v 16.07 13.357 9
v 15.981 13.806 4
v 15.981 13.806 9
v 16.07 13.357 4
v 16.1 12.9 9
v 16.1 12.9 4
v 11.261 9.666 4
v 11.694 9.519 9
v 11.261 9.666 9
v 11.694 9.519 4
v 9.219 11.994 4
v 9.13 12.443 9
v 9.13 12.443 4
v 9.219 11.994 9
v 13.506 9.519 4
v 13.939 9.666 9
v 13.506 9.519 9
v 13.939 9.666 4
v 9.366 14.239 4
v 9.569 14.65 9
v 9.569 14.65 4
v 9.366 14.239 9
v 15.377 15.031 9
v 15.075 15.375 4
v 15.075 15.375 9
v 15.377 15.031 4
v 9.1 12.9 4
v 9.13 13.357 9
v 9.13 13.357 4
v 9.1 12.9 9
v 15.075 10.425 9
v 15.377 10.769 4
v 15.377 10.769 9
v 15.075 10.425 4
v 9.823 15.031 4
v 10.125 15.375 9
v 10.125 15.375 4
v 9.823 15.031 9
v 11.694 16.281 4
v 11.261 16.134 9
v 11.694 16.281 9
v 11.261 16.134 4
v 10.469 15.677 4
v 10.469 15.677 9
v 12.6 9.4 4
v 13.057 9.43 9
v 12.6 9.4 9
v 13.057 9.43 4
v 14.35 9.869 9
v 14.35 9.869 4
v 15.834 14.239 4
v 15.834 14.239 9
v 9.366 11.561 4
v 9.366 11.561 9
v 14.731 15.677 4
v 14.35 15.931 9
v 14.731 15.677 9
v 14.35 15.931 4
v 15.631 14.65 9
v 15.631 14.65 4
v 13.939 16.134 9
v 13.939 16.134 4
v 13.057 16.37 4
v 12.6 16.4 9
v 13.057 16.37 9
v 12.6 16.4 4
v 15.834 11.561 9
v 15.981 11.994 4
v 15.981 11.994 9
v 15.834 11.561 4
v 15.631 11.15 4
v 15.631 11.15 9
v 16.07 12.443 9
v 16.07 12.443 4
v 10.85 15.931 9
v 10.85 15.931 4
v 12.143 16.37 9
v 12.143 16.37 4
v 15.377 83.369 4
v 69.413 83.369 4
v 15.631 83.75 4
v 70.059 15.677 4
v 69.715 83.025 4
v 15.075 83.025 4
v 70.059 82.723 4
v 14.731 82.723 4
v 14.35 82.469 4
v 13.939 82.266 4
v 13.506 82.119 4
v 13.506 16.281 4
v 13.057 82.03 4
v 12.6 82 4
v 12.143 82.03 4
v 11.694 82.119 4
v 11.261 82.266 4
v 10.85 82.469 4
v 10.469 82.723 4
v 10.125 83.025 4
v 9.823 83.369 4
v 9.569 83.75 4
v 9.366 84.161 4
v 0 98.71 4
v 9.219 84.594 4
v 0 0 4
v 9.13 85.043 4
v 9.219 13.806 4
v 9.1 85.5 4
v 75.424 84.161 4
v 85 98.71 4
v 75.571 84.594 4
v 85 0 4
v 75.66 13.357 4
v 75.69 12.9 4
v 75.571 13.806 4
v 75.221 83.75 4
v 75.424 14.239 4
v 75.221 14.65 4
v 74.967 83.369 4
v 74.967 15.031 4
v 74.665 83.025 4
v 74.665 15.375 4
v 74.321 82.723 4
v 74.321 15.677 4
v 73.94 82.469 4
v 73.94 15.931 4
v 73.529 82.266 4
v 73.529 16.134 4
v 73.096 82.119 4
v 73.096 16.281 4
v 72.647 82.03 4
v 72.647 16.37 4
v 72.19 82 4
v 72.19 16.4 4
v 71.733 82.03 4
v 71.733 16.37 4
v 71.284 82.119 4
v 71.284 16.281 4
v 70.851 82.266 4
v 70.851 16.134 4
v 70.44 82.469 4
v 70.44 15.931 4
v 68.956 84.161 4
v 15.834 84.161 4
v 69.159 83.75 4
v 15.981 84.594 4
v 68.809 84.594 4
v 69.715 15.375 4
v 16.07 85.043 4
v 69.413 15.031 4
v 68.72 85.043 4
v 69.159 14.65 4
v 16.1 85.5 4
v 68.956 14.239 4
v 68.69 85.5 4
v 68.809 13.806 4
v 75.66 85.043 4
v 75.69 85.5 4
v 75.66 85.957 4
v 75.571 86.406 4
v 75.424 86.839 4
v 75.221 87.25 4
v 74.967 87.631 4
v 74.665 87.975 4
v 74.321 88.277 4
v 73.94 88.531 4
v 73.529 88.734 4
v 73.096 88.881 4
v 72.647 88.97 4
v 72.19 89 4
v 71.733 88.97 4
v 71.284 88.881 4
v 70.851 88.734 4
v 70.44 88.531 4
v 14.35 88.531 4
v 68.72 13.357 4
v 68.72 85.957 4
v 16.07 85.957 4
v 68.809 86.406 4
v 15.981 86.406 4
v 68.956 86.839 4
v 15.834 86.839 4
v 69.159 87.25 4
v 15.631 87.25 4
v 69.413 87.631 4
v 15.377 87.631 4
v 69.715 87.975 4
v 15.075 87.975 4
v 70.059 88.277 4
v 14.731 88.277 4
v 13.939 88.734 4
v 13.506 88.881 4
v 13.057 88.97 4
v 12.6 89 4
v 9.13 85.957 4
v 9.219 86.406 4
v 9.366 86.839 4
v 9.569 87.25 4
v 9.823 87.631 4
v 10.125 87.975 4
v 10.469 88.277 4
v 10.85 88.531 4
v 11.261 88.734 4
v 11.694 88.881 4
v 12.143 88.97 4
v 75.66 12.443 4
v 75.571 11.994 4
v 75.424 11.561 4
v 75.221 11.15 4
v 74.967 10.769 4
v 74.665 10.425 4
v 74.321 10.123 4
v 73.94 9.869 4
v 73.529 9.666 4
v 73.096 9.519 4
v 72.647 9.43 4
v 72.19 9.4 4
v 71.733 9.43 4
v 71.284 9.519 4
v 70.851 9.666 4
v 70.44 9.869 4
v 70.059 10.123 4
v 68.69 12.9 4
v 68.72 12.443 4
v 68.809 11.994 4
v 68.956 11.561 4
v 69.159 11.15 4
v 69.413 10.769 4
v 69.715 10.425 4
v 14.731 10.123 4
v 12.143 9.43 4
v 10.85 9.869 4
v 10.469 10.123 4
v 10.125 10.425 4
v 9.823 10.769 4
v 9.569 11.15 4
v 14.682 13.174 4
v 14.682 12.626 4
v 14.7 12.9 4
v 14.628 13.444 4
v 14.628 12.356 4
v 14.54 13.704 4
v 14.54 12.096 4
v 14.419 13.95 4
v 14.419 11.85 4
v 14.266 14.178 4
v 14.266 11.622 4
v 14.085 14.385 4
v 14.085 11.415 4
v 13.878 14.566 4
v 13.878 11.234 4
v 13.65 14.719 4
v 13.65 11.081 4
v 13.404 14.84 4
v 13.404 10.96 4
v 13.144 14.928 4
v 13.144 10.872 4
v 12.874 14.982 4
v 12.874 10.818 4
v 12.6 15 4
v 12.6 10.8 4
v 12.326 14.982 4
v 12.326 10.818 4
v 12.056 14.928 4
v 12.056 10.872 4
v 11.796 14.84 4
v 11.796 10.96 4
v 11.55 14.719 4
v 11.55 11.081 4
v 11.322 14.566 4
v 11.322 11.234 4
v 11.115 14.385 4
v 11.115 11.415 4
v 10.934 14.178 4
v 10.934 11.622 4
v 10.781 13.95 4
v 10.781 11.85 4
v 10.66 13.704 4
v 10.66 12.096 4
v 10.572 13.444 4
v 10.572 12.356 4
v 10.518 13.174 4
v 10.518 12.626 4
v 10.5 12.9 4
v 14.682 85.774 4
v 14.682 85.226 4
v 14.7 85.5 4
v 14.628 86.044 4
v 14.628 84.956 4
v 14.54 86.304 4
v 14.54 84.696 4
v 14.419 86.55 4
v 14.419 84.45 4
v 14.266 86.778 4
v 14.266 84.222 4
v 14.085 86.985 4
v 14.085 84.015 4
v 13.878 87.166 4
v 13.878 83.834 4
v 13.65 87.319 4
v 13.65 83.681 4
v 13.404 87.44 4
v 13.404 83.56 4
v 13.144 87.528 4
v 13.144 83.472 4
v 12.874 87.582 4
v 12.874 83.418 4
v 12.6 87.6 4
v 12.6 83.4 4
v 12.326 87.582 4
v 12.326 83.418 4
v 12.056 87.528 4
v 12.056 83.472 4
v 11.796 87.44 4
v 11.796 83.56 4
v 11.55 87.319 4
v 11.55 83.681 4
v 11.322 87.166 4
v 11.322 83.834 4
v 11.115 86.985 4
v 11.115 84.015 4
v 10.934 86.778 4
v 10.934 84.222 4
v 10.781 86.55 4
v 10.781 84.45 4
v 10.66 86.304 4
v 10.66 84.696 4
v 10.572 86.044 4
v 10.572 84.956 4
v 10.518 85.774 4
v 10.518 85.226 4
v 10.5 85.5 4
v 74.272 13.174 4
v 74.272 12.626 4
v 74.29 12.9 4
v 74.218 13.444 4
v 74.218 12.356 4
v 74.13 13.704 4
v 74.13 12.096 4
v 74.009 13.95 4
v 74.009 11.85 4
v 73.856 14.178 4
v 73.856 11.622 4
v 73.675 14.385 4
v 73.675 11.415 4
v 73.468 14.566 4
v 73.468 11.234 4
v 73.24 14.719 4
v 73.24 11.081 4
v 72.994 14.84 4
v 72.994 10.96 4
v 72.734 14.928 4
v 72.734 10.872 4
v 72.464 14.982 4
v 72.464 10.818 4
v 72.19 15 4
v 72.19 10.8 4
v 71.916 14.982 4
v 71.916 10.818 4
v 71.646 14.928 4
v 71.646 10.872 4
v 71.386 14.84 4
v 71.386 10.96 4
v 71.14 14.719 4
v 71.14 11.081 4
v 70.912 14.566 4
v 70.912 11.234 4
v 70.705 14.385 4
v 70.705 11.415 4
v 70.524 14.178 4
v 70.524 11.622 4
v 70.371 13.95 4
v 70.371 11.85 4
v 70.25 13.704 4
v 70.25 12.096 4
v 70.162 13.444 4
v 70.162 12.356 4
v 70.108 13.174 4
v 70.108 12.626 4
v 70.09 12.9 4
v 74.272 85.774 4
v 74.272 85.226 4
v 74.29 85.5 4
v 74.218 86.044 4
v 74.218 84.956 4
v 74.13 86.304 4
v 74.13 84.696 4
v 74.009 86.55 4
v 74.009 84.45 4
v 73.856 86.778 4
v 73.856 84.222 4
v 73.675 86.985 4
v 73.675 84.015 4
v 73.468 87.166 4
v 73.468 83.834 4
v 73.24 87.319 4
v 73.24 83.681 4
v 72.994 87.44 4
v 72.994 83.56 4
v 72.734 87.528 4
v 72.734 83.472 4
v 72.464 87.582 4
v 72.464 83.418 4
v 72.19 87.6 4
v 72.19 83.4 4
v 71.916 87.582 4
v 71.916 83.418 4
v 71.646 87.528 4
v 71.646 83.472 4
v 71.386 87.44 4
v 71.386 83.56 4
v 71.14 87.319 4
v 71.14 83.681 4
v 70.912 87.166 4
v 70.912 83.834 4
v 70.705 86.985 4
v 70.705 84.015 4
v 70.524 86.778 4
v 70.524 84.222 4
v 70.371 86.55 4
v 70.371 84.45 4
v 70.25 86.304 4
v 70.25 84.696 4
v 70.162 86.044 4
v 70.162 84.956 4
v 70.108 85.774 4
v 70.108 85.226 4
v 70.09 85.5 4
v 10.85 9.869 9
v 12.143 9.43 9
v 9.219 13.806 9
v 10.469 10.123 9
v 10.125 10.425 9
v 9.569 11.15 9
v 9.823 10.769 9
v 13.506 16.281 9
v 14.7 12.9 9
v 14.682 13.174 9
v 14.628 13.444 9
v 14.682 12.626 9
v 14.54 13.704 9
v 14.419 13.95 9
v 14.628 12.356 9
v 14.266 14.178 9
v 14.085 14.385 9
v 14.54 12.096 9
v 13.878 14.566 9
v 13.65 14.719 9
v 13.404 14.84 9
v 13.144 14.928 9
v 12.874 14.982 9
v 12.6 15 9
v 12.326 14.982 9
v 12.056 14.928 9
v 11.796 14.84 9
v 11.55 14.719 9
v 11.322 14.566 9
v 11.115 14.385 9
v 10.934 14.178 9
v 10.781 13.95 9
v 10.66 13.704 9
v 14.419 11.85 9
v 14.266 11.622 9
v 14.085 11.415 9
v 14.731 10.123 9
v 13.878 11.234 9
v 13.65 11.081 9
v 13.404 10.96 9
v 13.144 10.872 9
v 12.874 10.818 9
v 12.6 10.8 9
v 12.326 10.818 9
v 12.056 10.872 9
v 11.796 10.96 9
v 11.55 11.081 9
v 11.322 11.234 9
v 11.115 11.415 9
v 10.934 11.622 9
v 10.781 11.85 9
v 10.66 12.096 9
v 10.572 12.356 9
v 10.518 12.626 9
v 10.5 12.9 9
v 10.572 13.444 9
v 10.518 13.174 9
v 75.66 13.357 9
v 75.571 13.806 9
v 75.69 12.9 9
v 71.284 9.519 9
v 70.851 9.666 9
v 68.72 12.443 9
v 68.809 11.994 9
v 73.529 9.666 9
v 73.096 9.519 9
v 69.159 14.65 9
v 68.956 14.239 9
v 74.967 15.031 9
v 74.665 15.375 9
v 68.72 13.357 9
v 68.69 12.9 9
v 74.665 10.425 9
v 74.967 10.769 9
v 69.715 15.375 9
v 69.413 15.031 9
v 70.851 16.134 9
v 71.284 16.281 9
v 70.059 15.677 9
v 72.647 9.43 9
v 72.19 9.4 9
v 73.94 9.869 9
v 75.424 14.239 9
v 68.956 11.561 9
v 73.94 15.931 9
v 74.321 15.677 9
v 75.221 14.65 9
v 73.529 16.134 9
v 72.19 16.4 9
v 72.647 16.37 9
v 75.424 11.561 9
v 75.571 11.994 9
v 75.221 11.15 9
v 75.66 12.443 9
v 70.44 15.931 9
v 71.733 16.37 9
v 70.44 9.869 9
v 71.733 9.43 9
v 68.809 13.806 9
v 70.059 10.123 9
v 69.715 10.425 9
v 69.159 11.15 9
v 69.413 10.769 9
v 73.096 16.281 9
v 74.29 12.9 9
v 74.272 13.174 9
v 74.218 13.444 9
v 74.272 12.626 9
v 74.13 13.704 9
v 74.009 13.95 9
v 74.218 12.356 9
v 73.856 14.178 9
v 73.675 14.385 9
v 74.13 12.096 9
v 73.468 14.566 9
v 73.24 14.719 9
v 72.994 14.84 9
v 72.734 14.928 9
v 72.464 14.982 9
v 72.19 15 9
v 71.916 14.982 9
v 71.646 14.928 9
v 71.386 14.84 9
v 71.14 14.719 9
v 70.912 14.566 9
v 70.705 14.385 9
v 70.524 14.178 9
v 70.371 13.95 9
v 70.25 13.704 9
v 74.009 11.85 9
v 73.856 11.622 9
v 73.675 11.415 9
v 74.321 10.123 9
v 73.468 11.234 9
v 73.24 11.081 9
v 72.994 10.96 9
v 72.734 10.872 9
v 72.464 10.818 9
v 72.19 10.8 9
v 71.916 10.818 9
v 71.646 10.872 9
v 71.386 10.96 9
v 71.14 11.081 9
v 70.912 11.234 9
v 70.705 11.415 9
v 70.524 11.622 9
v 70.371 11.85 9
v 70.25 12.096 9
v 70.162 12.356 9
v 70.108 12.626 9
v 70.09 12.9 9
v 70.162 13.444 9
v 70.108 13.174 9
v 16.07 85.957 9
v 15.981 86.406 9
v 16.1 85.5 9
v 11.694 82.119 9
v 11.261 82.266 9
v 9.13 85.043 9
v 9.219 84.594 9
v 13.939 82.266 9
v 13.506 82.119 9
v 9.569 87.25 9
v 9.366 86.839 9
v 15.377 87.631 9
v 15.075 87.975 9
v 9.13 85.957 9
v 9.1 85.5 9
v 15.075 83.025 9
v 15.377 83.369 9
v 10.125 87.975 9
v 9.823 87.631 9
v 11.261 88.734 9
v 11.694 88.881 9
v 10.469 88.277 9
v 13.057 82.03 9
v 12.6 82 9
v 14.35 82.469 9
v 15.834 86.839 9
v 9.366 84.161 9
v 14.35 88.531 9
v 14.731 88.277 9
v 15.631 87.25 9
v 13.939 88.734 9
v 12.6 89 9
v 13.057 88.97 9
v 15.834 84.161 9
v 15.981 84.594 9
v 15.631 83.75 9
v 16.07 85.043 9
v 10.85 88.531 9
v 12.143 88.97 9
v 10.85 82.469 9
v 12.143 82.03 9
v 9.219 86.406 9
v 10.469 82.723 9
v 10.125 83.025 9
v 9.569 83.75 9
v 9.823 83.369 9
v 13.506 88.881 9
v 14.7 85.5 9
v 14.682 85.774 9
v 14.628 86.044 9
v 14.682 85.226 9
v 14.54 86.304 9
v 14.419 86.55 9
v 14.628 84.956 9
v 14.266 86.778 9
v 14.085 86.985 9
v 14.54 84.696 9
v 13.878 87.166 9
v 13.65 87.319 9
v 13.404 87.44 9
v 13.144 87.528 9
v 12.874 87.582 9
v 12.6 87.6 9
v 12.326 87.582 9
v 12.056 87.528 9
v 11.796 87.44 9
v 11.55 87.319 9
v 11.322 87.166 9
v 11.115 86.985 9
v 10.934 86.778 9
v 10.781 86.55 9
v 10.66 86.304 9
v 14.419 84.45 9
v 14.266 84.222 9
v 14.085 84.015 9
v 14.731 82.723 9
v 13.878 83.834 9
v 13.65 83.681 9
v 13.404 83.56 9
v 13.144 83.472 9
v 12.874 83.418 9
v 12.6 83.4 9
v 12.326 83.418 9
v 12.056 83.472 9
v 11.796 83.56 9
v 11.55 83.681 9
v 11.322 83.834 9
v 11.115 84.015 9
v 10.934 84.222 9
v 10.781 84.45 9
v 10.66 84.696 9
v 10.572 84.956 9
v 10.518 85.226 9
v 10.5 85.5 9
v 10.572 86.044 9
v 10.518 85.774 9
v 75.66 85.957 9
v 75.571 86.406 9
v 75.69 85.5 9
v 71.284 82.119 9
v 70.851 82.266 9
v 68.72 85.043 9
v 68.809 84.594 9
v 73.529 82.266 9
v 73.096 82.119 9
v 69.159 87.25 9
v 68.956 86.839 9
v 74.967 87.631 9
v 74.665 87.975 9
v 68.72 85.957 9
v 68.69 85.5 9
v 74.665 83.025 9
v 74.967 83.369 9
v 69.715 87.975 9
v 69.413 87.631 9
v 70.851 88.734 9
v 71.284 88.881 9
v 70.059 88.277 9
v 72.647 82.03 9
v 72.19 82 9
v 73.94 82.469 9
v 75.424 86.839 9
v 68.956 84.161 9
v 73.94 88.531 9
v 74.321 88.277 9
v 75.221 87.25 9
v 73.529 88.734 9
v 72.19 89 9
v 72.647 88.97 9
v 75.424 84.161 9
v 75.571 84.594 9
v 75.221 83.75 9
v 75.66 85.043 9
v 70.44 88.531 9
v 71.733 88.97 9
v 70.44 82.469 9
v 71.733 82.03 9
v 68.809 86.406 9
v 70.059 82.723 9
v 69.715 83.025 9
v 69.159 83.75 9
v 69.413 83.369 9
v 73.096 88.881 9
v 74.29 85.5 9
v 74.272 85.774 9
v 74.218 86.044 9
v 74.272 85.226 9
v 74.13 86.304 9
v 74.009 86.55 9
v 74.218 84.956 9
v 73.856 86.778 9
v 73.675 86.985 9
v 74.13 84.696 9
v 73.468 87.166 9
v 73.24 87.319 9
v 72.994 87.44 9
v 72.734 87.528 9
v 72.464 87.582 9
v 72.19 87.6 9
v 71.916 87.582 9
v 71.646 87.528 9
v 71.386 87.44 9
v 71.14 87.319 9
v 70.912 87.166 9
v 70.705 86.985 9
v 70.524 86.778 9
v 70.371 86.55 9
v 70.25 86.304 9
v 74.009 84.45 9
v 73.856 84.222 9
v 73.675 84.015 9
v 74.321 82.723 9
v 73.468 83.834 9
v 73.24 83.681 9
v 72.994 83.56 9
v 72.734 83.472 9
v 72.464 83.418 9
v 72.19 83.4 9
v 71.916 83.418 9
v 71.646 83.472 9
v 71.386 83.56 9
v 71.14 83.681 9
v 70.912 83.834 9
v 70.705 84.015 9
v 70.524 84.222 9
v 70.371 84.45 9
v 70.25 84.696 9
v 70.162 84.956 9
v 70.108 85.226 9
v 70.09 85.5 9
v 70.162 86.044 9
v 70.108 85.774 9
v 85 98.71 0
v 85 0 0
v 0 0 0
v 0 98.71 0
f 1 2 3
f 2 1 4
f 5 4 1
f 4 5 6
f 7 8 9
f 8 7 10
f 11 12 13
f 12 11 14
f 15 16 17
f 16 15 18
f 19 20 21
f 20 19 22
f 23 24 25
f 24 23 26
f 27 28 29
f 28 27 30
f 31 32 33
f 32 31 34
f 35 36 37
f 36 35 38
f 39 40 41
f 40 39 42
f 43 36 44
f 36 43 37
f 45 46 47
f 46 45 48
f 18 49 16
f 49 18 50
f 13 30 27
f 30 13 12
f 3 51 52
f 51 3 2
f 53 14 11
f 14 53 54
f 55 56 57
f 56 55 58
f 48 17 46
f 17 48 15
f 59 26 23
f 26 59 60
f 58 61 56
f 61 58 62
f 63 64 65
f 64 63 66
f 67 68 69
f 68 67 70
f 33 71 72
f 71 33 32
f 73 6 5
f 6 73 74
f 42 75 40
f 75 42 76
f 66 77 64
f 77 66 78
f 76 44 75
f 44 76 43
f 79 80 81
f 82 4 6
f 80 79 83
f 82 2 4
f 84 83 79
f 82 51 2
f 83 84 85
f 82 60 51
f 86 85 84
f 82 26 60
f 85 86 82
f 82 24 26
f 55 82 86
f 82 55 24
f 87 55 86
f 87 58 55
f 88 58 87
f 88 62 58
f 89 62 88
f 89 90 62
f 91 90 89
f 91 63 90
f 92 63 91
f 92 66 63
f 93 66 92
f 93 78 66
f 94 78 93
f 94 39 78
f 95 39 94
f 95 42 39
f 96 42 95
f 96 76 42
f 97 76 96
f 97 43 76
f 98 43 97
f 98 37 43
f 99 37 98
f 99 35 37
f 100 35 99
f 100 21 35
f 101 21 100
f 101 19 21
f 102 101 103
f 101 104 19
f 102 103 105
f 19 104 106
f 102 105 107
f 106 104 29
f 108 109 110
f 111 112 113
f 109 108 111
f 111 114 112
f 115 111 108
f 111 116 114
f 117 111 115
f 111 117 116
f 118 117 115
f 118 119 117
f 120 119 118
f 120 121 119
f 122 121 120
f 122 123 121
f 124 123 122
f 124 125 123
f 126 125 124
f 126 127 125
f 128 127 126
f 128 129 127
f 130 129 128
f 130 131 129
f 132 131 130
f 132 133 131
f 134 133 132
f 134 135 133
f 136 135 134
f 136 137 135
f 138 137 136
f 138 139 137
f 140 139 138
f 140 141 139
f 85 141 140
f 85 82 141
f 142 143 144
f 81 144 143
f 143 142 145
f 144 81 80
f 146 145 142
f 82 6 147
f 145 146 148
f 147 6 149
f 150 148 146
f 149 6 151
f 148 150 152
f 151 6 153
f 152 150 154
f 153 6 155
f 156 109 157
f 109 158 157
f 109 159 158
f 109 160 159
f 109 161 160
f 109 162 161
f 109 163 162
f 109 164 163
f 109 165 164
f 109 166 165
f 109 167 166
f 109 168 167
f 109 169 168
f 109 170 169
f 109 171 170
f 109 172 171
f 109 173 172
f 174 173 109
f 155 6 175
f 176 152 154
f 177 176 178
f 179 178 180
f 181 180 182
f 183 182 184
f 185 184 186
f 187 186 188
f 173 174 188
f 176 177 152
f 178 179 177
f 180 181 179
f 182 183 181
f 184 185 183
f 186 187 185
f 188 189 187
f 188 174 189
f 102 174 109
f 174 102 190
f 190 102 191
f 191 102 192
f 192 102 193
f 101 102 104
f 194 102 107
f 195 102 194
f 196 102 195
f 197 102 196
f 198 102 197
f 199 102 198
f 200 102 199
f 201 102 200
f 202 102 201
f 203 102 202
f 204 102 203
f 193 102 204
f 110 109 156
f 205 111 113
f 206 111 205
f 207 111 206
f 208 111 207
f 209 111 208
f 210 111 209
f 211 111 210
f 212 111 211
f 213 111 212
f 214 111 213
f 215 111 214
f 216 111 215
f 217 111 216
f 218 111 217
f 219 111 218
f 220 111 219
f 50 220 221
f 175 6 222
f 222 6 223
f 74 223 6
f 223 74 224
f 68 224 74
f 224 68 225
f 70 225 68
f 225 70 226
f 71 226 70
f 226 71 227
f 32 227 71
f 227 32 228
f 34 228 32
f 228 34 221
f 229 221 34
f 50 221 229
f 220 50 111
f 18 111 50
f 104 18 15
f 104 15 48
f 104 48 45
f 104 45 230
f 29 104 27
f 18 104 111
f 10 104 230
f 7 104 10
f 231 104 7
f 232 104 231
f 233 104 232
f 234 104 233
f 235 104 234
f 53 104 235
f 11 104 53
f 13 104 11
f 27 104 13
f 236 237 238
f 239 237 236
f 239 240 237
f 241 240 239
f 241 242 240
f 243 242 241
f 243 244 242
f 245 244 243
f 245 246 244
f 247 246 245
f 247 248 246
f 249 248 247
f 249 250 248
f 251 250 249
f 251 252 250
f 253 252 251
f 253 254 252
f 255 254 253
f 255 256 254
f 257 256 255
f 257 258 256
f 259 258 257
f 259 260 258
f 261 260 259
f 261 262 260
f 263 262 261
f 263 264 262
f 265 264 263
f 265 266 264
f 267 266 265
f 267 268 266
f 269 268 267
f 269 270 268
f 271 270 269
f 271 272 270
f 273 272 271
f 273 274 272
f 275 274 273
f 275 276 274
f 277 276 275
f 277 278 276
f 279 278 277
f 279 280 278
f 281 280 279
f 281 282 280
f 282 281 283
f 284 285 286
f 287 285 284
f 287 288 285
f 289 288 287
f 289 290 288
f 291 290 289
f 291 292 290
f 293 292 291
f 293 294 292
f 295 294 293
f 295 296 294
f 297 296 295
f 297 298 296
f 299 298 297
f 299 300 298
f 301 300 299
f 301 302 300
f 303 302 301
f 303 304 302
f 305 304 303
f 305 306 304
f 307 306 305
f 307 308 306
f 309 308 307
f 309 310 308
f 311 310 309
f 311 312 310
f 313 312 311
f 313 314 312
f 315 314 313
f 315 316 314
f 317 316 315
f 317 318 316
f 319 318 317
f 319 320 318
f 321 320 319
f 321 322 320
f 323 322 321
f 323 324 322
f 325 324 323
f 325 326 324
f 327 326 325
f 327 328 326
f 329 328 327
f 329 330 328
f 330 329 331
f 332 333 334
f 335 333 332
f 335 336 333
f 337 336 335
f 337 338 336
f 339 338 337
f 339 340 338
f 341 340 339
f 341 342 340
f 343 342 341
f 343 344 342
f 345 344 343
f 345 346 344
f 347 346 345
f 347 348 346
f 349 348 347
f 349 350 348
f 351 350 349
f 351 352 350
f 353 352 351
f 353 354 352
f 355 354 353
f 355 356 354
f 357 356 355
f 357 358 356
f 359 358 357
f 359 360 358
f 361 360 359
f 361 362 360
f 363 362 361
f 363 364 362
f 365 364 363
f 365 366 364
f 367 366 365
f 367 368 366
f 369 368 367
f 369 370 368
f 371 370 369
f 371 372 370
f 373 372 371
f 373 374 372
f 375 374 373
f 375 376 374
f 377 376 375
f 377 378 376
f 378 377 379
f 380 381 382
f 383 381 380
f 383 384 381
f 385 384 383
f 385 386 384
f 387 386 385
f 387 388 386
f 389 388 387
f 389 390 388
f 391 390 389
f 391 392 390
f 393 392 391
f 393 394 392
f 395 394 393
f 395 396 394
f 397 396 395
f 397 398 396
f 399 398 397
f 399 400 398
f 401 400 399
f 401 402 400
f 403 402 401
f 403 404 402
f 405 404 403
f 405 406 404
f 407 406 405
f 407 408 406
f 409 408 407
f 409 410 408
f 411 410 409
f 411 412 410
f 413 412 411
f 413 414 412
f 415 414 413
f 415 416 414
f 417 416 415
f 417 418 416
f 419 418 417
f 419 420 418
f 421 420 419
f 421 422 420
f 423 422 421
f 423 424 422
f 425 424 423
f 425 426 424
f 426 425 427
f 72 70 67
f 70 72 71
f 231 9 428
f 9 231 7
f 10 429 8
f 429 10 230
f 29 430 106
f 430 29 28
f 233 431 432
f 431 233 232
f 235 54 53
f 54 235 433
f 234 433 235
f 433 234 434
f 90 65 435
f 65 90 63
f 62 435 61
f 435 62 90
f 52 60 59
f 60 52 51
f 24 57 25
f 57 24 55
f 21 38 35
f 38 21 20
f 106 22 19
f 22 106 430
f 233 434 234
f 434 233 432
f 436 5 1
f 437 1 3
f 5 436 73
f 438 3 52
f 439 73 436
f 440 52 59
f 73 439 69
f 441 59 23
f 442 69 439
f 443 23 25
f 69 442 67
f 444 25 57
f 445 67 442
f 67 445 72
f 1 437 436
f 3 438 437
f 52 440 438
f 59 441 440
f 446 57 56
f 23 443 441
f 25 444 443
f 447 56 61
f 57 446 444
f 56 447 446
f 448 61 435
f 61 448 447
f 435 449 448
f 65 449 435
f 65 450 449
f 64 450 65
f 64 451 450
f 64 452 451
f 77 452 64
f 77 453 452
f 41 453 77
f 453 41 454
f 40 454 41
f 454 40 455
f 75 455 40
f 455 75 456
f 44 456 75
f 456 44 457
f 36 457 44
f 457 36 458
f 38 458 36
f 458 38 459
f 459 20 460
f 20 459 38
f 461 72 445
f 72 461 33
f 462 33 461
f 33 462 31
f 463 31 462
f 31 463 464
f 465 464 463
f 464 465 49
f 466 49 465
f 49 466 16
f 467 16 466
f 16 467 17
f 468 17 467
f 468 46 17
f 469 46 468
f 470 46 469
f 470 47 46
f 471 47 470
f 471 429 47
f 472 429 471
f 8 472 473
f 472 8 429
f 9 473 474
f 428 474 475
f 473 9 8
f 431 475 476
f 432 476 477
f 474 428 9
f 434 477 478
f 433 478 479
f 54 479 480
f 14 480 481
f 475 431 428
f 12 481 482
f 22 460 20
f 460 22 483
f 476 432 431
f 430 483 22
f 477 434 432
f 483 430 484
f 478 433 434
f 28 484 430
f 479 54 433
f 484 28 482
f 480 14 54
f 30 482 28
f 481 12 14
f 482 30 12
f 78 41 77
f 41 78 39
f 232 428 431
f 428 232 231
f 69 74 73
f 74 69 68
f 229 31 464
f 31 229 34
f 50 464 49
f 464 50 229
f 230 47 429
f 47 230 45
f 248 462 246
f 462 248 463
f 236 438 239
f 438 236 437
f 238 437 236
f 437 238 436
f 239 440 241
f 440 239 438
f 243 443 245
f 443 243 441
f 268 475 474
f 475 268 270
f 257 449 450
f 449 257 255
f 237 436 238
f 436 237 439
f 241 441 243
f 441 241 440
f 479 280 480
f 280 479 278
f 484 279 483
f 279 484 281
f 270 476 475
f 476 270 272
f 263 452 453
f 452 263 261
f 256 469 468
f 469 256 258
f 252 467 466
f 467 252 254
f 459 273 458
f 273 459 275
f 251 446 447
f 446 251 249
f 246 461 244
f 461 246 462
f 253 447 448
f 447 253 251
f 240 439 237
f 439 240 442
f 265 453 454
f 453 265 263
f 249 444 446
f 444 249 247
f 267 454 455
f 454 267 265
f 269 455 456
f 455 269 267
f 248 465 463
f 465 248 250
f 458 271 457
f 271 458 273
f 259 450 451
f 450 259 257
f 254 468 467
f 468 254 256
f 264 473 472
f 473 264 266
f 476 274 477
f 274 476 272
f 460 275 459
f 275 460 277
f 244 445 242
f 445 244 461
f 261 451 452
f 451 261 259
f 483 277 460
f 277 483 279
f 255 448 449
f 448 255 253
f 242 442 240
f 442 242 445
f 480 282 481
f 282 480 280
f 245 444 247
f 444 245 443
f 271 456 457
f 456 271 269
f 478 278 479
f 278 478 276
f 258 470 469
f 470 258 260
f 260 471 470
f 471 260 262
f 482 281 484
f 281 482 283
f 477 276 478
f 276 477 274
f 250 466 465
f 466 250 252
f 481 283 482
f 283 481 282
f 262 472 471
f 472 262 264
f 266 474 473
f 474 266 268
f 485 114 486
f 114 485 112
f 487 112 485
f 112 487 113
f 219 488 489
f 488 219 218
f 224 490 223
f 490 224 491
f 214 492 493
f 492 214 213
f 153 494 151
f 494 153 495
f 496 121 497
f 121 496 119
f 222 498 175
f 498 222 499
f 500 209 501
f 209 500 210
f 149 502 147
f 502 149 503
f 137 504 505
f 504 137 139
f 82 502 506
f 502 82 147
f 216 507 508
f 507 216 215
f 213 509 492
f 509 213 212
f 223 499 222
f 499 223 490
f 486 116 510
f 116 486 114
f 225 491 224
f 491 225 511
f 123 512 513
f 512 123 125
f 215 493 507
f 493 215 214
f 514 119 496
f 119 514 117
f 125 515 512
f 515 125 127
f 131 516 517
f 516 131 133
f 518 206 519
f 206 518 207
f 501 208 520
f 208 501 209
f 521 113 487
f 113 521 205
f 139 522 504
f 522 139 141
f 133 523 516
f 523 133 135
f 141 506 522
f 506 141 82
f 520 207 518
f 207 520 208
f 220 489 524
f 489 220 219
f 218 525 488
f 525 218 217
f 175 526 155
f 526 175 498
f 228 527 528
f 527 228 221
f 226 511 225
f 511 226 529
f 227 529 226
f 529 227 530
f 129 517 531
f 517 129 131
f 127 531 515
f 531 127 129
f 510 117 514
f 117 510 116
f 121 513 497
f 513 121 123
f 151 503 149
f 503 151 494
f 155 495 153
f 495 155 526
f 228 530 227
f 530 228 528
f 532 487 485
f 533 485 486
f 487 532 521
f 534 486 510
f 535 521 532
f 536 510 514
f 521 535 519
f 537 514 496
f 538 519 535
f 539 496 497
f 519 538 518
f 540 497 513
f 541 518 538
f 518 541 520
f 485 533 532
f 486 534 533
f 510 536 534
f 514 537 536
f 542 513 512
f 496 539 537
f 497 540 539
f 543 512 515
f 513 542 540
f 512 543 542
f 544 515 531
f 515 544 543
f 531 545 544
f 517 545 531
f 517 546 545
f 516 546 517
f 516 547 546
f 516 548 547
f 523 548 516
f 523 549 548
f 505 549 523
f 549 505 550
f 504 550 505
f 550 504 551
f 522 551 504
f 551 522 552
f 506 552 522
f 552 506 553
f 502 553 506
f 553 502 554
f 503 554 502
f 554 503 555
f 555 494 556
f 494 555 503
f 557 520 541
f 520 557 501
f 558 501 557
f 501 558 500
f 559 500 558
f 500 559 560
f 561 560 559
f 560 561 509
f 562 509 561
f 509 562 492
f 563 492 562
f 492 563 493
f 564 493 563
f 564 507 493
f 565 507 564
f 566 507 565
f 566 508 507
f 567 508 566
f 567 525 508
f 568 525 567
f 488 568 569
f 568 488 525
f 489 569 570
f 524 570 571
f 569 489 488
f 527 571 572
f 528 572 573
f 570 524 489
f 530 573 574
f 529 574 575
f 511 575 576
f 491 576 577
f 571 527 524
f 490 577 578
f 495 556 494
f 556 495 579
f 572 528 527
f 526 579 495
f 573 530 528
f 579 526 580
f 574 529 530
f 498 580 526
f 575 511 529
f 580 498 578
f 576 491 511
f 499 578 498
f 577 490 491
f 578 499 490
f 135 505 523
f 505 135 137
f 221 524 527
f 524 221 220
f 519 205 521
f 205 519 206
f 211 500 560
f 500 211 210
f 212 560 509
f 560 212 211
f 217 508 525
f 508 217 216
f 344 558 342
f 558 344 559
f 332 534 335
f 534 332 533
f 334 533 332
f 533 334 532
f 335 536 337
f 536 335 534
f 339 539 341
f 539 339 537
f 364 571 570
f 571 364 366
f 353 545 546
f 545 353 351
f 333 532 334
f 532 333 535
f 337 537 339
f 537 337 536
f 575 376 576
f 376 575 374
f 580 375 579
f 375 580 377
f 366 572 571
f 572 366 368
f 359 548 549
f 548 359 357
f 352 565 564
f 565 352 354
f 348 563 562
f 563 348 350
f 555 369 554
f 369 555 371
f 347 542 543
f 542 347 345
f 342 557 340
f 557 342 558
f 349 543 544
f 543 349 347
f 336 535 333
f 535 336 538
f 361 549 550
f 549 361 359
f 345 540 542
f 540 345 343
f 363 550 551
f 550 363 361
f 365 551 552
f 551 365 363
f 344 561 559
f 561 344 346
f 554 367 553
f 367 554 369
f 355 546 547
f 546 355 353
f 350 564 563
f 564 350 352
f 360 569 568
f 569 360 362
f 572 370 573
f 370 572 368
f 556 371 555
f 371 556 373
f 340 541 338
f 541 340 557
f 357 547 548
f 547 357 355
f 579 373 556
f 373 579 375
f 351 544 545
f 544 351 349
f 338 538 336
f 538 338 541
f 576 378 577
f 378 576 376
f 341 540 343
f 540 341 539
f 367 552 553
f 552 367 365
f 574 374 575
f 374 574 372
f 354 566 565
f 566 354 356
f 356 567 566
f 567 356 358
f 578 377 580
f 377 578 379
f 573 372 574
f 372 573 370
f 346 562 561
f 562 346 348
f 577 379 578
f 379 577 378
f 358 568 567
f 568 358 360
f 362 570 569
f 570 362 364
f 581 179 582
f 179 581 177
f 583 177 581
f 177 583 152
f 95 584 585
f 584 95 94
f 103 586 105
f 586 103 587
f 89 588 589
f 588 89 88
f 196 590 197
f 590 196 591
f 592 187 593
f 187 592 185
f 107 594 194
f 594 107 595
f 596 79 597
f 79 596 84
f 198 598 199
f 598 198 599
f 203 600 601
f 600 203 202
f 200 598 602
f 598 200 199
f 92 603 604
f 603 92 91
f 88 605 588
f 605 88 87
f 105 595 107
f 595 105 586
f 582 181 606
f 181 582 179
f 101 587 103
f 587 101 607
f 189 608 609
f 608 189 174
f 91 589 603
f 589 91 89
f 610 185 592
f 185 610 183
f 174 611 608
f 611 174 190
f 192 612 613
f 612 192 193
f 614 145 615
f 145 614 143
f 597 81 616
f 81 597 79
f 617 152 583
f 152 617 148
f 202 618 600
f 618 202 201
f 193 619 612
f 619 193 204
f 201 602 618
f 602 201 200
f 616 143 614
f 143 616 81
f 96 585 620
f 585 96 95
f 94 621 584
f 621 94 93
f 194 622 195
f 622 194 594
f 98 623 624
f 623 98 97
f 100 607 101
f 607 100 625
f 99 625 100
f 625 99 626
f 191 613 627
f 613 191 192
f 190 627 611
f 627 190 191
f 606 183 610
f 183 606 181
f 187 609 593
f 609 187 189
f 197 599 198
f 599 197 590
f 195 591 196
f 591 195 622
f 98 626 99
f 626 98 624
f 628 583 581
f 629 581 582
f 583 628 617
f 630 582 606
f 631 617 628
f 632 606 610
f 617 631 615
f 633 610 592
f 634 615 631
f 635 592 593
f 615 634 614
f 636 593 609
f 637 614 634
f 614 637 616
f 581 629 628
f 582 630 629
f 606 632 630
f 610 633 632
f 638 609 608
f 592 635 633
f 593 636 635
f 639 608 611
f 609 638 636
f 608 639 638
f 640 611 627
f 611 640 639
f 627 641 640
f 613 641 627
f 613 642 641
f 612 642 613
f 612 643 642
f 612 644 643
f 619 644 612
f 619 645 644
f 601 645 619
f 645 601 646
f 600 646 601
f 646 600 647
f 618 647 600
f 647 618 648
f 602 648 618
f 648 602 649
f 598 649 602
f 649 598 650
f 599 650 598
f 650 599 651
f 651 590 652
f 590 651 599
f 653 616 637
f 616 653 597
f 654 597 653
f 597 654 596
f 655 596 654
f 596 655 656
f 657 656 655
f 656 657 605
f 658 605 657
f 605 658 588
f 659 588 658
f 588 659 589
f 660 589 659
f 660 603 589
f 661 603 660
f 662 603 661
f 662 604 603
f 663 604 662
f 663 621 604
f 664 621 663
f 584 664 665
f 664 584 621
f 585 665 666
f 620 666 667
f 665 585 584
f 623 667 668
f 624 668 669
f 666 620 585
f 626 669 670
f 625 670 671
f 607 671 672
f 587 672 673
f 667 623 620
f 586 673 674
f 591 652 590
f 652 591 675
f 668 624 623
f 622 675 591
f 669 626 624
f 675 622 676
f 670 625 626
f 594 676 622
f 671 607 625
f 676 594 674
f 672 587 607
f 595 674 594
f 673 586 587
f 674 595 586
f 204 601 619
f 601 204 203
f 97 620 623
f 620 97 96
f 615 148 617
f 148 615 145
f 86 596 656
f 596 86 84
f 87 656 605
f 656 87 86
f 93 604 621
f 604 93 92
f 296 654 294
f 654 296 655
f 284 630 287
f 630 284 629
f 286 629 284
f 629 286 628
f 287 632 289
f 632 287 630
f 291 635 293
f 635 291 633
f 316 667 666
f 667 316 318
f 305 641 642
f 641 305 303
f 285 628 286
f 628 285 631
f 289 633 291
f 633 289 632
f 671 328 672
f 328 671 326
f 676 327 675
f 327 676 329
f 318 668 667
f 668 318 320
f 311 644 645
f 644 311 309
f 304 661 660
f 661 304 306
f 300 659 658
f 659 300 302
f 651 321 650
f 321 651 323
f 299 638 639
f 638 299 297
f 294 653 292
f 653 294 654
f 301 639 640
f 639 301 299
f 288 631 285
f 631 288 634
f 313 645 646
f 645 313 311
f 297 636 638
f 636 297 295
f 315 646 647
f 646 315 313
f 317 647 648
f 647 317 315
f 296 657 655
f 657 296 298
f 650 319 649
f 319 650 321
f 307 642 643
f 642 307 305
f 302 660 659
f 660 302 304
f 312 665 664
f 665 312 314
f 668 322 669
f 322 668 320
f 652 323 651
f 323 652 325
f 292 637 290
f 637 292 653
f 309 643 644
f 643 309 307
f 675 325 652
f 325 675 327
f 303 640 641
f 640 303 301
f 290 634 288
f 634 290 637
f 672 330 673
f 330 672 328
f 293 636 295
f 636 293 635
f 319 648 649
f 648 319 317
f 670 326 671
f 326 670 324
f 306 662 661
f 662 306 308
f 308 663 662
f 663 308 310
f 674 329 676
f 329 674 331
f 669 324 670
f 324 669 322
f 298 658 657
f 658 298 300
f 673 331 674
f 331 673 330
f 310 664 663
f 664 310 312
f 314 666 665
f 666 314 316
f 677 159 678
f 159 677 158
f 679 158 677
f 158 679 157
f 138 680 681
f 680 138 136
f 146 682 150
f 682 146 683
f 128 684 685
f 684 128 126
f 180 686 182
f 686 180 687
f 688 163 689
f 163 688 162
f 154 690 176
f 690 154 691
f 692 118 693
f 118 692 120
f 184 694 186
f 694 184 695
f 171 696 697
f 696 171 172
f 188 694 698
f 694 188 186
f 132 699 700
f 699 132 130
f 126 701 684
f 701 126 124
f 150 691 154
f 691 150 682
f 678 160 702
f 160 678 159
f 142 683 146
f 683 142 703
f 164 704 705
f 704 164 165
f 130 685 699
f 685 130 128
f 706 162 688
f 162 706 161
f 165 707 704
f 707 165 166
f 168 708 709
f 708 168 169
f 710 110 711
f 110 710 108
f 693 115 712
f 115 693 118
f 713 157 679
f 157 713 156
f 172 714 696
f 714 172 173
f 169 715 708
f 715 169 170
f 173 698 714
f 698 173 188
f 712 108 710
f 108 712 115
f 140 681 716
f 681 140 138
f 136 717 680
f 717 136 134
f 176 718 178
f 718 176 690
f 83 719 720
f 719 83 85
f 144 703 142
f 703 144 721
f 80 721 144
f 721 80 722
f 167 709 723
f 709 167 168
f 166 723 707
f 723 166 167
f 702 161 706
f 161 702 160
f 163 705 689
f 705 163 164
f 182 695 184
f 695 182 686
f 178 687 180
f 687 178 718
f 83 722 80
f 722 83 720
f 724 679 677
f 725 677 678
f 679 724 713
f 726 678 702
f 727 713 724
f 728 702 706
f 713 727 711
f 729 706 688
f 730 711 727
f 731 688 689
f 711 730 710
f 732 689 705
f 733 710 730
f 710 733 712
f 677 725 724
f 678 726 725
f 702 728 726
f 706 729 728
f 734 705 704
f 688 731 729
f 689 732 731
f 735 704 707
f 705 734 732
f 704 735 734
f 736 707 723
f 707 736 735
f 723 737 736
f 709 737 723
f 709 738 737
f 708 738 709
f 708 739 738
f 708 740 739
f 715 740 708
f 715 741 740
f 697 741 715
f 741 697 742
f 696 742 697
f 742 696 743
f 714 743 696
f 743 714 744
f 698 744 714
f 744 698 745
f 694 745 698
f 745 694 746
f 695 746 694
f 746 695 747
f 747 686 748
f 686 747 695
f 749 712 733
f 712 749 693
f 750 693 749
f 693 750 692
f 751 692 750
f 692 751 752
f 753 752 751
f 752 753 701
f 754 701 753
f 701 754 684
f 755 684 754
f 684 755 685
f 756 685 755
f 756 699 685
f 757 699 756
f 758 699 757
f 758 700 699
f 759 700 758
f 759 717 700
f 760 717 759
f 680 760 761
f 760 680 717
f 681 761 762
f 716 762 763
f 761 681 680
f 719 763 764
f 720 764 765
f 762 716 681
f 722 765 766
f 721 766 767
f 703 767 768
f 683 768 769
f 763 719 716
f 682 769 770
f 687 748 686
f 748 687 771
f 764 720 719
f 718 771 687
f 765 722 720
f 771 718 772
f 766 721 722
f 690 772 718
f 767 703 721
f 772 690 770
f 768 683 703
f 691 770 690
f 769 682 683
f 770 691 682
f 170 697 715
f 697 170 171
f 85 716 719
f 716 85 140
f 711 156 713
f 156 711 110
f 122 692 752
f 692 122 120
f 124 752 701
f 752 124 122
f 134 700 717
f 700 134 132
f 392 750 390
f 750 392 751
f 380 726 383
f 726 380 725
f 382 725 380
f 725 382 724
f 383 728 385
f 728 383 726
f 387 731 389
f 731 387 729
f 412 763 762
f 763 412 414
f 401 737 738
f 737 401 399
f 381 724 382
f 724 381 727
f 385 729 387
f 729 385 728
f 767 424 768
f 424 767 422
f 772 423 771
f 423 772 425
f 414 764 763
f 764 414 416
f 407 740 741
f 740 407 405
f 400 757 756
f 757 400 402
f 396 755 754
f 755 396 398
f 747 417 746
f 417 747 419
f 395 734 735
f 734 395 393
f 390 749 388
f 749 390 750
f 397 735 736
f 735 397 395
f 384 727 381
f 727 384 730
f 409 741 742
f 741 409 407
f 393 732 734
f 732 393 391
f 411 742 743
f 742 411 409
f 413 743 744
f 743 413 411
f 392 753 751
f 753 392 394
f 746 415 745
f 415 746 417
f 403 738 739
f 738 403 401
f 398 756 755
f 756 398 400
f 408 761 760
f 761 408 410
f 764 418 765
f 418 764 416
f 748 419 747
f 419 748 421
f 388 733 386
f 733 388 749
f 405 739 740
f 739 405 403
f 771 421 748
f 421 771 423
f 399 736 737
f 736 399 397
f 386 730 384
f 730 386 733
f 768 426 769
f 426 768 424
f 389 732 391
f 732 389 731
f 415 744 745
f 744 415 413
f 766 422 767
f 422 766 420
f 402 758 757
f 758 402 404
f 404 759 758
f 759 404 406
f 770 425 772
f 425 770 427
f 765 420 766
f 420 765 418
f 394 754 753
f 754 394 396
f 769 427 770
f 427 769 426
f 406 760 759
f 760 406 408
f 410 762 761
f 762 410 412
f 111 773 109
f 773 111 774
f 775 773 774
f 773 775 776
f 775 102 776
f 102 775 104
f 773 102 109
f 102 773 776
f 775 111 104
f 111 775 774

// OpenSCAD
// PCB standoff pattern using PCB-local coordinate mapping.

$fn = 48;

pcb_width = 65;
pcb_length = 78.71;
pcb_origin_x = 10;
pcb_origin_y = 10;
floor_thickness = 4;
standoff_height = 5;
standoff_outer_diameter = 7;
insert_hole_diameter = 4.2;
insert_depth = 5;

mounting_hole_positions = [
    [2.6, 2.9],
    [62.19, 2.9],
    [2.6, 75.5],
    [62.19, 75.5]
];

function pcb_x(x) = pcb_origin_x + x;
function pcb_y(y) = pcb_origin_y + y;

module standoff_at(x, y) {
    translate([pcb_x(x), pcb_y(y), floor_thickness])
        difference() {
            cylinder(h = standoff_height, d = standoff_outer_diameter);
            translate([0, 0, standoff_height - insert_depth - 0.02])
                cylinder(h = insert_depth + 0.04, d = insert_hole_diameter);
        }
}

module screw_access_preview(x, y) {
    %color([1, 1, 0, 0.25])
        translate([pcb_x(x), pcb_y(y), floor_thickness + standoff_height])
            cylinder(h = 25, d = 8);
}

cube([pcb_width + 20, pcb_length + 20, floor_thickness]);
for (p = mounting_hole_positions) {
    standoff_at(p[0], p[1]);
    screw_access_preview(p[0], p[1]);
}

%color([0.1, 0.45, 1, 0.25])
    translate([pcb_origin_x, pcb_origin_y, floor_thickness + standoff_height])
        cube([pcb_width, pcb_length, 1.6]);
